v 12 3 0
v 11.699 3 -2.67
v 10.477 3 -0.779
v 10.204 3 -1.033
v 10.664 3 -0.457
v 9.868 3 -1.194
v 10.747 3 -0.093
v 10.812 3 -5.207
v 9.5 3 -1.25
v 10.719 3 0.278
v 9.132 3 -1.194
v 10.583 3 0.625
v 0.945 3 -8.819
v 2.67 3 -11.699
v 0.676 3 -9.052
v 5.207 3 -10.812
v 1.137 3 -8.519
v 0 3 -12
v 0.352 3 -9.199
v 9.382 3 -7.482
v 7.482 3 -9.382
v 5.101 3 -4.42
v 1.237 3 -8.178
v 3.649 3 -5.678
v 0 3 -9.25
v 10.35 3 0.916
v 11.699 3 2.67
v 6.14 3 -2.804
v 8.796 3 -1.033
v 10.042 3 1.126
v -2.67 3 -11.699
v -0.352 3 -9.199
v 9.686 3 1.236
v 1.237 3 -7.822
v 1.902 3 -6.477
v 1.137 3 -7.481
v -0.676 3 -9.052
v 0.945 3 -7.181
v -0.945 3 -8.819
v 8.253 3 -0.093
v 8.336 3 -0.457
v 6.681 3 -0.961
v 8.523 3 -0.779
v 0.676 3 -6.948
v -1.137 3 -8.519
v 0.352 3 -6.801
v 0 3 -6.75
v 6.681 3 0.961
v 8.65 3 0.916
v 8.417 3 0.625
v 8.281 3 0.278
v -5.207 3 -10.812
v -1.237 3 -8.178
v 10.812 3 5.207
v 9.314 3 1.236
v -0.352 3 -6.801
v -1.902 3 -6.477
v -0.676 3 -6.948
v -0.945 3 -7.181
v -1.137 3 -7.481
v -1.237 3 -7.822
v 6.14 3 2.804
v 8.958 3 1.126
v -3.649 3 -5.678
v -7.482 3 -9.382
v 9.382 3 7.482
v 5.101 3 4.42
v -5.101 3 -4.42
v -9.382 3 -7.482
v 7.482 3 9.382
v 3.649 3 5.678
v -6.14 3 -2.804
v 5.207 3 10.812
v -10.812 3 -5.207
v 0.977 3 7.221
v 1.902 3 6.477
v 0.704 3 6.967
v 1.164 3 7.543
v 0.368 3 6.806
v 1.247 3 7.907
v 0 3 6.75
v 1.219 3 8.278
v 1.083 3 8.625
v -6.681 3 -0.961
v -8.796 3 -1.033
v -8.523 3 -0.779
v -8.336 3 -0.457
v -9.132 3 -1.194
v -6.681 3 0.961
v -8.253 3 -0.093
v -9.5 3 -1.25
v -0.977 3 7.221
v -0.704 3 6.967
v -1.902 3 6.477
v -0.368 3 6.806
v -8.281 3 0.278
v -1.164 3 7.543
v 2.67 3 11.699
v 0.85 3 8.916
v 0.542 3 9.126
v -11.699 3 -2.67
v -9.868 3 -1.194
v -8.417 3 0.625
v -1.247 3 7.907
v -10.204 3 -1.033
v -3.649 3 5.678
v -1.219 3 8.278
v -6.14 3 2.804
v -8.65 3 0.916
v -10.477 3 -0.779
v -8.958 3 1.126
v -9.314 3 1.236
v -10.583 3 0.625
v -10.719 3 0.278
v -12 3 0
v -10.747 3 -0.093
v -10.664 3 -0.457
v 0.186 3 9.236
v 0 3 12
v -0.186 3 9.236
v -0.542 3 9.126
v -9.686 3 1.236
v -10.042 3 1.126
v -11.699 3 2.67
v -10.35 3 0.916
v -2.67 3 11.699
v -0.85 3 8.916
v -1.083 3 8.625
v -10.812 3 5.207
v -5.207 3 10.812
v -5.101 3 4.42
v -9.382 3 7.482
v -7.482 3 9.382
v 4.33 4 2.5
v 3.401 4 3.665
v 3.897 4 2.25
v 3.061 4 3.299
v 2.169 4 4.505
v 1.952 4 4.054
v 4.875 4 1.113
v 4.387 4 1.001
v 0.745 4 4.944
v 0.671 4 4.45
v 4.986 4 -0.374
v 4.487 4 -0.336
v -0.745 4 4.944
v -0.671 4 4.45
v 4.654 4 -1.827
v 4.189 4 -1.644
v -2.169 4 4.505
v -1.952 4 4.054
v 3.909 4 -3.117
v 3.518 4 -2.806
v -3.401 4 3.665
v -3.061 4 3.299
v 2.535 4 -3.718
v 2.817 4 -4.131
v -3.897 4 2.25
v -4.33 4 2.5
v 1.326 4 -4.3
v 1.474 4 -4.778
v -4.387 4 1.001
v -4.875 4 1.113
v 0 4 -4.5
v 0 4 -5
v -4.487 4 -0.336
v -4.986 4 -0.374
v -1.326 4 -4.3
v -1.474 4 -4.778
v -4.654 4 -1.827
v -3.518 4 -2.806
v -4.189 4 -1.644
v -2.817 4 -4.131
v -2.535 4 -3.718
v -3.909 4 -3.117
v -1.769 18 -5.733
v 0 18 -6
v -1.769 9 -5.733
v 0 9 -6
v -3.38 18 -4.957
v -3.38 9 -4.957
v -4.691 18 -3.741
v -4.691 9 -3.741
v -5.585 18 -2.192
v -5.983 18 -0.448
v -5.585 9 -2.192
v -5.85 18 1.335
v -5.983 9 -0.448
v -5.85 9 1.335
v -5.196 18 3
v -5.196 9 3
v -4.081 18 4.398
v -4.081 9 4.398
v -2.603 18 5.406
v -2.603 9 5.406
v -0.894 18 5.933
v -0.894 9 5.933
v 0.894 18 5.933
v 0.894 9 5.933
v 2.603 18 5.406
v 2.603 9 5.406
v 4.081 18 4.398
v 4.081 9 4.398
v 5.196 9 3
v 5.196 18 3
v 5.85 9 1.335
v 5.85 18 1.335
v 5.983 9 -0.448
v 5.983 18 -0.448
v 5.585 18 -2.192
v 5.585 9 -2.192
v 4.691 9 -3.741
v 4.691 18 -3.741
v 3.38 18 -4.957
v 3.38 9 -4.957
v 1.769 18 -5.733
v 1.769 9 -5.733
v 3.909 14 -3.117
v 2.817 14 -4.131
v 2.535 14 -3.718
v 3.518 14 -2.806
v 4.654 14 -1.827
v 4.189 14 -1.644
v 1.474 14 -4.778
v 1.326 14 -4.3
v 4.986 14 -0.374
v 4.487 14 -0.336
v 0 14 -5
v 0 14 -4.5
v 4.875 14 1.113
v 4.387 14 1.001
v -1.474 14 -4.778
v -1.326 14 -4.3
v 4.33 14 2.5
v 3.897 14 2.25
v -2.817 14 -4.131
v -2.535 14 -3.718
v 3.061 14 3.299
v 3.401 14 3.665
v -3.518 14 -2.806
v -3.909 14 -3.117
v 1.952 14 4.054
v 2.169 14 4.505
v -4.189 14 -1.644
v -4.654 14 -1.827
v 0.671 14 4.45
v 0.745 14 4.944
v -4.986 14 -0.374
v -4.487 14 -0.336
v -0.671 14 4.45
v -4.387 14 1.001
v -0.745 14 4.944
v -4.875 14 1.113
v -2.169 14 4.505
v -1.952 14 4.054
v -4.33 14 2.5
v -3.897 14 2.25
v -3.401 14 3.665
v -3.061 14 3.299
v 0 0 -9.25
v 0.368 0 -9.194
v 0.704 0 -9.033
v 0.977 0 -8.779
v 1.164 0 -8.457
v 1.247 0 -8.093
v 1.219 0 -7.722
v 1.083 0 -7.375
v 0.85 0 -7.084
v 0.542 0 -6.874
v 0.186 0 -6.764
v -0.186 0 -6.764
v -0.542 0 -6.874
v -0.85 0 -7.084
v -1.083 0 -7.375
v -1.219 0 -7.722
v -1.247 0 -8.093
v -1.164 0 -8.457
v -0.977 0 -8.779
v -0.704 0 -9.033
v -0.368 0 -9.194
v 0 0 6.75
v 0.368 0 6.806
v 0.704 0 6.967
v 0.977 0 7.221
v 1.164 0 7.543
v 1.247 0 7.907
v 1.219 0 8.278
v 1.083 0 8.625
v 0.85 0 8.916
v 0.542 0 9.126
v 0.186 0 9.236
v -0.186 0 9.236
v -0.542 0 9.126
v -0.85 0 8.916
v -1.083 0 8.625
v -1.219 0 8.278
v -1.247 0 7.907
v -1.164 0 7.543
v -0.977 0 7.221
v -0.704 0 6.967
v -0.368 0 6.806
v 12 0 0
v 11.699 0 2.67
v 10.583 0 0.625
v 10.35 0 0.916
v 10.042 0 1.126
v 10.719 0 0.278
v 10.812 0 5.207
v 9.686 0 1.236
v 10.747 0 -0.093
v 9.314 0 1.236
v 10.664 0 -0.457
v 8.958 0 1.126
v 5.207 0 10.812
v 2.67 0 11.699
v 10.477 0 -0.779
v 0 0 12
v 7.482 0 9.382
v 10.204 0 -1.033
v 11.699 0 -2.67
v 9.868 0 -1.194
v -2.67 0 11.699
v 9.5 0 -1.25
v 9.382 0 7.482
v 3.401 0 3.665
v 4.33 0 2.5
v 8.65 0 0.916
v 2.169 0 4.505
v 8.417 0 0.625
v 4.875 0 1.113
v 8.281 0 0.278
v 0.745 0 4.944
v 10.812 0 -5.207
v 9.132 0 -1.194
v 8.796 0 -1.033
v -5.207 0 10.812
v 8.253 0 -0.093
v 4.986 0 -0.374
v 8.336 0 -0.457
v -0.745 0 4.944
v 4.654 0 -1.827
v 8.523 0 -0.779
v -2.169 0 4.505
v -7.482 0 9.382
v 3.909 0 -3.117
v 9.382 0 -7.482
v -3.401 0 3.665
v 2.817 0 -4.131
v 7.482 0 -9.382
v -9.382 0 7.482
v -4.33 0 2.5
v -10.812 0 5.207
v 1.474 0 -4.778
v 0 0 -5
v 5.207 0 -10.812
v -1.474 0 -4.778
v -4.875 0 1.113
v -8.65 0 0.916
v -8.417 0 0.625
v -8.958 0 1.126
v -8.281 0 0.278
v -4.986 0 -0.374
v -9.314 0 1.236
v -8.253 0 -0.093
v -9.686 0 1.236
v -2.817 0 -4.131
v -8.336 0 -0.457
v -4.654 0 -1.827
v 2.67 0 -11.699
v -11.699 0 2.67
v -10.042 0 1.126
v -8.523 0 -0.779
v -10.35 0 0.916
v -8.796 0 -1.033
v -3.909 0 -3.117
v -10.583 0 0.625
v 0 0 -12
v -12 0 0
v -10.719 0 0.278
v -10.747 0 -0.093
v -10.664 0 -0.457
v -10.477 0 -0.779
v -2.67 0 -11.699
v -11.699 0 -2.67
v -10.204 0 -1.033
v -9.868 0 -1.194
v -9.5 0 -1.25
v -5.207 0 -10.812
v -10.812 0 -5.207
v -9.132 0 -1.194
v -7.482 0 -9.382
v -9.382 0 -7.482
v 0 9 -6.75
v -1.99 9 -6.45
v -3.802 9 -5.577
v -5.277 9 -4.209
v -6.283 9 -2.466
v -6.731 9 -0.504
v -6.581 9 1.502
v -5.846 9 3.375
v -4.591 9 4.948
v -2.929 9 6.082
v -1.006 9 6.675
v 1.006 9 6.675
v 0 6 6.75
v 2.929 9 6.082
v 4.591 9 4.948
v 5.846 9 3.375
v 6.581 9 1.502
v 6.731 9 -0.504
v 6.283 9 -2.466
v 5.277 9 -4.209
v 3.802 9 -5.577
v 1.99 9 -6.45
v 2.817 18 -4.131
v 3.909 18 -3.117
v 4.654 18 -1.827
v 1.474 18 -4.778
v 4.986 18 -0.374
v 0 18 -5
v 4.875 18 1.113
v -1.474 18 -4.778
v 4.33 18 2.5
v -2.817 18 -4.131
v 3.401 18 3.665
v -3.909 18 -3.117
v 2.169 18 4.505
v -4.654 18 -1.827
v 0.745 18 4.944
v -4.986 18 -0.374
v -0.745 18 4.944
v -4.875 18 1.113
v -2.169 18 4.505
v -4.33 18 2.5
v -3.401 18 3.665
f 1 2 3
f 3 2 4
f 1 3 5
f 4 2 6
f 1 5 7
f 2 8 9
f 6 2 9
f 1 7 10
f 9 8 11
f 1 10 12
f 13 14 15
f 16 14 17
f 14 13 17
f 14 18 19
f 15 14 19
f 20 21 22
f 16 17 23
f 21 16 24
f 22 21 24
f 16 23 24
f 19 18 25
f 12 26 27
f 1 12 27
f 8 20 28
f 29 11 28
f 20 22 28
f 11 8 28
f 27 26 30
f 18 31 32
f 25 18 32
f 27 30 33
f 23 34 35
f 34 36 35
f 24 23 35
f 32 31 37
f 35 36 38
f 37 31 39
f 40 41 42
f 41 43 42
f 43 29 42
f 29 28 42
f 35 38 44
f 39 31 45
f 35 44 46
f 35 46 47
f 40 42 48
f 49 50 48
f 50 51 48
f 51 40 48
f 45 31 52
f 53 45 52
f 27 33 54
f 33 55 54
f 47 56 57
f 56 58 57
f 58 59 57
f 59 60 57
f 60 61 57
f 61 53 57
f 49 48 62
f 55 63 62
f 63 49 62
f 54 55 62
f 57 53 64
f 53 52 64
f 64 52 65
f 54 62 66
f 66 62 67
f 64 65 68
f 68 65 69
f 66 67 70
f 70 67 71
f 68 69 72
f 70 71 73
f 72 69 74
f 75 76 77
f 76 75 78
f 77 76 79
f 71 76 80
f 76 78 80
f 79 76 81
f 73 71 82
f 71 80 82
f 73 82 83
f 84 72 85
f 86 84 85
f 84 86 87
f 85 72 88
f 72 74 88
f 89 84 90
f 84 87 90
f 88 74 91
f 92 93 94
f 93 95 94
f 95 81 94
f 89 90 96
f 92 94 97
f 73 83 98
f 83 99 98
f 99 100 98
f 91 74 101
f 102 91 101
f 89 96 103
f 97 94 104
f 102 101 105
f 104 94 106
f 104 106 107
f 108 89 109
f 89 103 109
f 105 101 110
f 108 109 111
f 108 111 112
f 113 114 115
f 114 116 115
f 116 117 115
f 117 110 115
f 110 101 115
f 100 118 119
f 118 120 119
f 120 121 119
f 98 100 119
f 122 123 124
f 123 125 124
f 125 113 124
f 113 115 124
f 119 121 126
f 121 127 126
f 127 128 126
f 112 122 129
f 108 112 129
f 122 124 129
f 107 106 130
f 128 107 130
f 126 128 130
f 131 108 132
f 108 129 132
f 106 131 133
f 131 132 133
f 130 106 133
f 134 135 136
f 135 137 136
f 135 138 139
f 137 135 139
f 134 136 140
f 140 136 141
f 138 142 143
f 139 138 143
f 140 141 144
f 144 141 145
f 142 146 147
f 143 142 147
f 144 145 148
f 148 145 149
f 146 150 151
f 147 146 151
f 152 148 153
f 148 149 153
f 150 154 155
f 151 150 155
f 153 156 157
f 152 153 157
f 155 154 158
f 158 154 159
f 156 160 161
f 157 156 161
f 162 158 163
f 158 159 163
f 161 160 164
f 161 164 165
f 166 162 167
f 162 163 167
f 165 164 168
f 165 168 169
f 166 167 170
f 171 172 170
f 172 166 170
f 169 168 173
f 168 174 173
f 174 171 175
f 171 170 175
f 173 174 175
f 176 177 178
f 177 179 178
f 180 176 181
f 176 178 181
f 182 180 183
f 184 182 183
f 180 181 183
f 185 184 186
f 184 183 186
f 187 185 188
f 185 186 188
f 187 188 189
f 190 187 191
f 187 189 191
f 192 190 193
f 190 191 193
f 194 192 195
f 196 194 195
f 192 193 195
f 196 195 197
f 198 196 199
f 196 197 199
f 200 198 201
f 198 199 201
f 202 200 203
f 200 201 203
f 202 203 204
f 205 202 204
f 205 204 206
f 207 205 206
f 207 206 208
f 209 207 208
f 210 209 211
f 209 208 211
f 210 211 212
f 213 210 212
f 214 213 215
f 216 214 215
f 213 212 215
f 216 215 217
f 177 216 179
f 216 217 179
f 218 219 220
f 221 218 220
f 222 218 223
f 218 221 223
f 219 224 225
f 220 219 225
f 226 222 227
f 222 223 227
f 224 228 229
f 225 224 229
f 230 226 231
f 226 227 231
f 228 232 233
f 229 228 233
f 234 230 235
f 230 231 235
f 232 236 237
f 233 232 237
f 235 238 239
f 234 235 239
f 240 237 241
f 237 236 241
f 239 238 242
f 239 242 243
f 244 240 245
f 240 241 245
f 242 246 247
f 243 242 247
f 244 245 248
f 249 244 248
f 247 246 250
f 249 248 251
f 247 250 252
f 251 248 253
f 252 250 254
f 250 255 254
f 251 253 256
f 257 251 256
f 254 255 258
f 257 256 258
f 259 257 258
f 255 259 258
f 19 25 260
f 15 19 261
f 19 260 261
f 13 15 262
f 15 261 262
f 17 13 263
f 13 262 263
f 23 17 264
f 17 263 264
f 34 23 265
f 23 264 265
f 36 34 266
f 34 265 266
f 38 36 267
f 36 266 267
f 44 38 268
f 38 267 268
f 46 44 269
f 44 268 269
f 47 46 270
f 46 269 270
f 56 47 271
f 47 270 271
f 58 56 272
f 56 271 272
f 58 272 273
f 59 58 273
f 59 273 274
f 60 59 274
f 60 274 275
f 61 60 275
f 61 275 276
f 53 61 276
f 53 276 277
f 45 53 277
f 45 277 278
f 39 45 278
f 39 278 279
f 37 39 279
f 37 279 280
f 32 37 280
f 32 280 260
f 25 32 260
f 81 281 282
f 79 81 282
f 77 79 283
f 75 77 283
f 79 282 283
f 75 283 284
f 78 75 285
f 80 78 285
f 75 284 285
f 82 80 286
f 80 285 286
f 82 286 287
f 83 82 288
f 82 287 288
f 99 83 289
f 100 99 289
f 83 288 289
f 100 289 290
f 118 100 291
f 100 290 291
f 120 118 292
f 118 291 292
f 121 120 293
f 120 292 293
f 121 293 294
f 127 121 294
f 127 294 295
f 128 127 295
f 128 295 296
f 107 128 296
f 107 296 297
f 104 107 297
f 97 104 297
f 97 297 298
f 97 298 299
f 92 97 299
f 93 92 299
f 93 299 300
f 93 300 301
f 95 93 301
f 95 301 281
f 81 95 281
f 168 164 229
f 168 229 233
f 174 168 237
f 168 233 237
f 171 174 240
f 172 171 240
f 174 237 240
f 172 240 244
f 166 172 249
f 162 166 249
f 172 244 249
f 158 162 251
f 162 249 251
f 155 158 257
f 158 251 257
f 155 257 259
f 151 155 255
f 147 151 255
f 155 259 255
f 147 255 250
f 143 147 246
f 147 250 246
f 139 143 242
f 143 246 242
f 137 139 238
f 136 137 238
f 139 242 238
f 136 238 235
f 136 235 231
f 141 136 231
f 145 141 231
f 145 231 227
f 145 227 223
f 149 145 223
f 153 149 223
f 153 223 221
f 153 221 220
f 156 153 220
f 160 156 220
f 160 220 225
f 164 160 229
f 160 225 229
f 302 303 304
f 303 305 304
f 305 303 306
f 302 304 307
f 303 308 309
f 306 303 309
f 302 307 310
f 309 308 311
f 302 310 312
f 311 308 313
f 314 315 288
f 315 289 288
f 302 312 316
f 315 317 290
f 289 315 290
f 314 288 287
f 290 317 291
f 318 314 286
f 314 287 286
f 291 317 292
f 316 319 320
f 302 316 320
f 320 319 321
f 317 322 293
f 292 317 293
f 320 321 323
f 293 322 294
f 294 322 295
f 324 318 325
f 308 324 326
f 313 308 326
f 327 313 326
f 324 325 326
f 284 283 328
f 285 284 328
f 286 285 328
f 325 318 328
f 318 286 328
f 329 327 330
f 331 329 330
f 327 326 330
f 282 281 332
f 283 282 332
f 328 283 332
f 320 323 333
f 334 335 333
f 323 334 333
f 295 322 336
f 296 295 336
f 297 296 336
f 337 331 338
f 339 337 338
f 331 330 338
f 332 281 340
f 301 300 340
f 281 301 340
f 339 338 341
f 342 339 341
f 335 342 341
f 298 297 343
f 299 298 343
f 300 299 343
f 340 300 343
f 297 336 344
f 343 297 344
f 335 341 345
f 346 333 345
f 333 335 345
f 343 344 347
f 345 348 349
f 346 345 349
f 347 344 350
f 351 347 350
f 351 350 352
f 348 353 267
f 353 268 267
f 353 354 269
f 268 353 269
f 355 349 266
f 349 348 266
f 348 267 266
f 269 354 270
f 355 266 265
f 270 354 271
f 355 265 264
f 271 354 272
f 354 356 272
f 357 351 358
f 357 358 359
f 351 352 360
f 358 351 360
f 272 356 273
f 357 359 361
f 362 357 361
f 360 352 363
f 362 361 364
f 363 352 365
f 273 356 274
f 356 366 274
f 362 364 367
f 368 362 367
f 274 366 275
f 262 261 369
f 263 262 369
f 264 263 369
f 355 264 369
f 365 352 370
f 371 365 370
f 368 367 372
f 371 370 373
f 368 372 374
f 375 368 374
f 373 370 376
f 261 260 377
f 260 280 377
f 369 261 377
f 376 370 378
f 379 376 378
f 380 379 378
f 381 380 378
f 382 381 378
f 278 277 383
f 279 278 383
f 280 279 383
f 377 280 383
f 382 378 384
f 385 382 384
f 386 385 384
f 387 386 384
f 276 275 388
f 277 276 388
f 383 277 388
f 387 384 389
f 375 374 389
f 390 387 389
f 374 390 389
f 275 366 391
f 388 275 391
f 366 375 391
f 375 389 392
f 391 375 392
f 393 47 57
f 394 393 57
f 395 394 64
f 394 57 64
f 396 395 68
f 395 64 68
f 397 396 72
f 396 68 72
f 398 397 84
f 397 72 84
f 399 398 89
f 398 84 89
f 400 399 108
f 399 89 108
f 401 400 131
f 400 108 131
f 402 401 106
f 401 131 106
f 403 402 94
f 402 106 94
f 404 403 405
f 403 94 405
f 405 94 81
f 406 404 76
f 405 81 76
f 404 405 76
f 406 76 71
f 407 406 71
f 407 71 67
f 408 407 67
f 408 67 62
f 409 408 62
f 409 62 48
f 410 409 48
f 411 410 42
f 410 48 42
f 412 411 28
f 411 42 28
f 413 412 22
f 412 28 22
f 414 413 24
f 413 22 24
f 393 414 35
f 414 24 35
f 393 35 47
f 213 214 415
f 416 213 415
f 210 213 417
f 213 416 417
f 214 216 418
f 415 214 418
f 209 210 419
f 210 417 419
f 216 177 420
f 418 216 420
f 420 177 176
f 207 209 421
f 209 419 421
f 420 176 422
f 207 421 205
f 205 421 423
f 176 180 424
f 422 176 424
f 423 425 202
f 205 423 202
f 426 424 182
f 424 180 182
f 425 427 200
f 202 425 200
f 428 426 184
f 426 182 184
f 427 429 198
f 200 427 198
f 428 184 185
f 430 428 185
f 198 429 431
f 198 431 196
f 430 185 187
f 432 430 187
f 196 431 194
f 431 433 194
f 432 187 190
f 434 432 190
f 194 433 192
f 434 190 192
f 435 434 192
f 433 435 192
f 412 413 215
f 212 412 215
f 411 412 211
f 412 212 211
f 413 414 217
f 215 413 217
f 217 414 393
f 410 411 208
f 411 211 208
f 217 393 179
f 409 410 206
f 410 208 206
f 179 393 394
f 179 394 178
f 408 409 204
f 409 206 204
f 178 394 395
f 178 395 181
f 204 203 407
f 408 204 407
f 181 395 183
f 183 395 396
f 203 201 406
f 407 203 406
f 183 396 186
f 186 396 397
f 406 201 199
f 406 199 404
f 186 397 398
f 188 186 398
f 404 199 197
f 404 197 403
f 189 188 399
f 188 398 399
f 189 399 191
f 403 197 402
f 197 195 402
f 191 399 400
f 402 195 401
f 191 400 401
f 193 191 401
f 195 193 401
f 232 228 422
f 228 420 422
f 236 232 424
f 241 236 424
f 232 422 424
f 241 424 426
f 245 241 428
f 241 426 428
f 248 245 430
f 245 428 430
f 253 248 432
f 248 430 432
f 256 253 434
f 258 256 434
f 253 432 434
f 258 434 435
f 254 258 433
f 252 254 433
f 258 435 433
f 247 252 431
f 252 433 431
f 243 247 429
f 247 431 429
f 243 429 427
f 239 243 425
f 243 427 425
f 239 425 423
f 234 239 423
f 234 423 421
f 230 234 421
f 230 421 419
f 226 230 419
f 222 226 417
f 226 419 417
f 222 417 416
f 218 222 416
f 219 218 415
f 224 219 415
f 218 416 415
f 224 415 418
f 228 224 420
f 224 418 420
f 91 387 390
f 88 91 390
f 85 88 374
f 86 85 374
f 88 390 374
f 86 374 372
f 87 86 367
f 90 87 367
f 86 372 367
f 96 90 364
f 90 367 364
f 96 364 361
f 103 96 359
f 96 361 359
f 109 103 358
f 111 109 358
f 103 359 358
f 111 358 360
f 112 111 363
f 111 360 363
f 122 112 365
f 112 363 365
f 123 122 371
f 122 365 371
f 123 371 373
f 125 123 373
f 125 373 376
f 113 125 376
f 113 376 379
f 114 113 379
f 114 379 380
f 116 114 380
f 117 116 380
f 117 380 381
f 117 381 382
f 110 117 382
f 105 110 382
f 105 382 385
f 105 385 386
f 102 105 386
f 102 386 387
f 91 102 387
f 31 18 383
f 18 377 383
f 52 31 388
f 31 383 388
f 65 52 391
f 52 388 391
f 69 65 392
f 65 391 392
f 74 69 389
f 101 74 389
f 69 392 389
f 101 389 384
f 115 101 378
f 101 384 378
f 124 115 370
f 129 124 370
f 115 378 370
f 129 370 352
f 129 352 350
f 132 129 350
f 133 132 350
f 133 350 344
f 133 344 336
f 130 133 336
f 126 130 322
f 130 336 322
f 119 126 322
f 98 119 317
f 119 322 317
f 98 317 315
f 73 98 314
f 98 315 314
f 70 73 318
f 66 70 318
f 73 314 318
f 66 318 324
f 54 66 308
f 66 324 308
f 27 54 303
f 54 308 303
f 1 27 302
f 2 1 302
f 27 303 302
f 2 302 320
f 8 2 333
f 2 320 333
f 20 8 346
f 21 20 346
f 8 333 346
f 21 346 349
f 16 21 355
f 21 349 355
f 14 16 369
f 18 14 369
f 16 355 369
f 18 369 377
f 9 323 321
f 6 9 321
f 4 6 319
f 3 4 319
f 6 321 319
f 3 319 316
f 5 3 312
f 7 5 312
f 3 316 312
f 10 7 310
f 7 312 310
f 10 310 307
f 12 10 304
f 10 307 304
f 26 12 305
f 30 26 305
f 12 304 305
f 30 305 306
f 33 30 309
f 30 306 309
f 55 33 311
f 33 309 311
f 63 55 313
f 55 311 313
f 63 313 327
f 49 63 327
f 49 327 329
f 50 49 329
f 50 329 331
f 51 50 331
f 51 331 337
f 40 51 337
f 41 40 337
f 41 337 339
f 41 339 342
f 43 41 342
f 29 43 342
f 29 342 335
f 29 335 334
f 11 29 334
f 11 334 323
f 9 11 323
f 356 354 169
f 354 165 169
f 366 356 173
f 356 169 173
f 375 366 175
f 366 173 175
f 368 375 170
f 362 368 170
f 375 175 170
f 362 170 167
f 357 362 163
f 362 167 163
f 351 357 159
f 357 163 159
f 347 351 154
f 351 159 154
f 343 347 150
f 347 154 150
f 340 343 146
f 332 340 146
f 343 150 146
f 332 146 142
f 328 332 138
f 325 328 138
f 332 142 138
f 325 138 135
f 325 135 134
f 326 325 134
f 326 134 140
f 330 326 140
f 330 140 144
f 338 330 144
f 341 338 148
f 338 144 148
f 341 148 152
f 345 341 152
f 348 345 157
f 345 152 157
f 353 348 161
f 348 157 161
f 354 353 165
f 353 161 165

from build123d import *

# Parameters (mm, degrees)
SKETCH3_R          = 1.25
CUT_EXTRUDE1_DEPTH = 6


with BuildPart() as part:
    # Sketch2 → Revolve1 (revolve)
    with BuildSketch(Plane.XY, mode=Mode.PRIVATE) as revolve1_sk:
        Polygon((-12, 0), (-5, 0), (-5, 4), (-4.5, 4), (-4.5, 14), (-5, 14), (-5, 18), (-6, 18), (-6, 9), (-6.75, 9), (-6.75, 3), (-12, 3), align=None)
    revolve(revolve1_sk.sketch.rotate(Axis((0, 0, 0), (0, 1, 0)), 270), axis=Axis((0, 0, 0), (0, 1, 0)))

    # Sketch3 → Cut-Extrude1 (cut)
    with BuildSketch(Plane.XZ):
        with Locations(Location((0, 8, 0), (0, 0, 270))):
            Circle(SKETCH3_R)
        with Locations(Location((9.5, 0, 0), (0, 0, 270))):
            Circle(SKETCH3_R)
        with Locations(Location((0, -8, 0), (0, 0, 270))):
            Circle(SKETCH3_R)
        with Locations(Location((-9.5, 0, 0), (0, 0, 270))):
            Circle(SKETCH3_R)
    extrude(amount=-CUT_EXTRUDE1_DEPTH, mode=Mode.SUBTRACT)


solid = part.part
